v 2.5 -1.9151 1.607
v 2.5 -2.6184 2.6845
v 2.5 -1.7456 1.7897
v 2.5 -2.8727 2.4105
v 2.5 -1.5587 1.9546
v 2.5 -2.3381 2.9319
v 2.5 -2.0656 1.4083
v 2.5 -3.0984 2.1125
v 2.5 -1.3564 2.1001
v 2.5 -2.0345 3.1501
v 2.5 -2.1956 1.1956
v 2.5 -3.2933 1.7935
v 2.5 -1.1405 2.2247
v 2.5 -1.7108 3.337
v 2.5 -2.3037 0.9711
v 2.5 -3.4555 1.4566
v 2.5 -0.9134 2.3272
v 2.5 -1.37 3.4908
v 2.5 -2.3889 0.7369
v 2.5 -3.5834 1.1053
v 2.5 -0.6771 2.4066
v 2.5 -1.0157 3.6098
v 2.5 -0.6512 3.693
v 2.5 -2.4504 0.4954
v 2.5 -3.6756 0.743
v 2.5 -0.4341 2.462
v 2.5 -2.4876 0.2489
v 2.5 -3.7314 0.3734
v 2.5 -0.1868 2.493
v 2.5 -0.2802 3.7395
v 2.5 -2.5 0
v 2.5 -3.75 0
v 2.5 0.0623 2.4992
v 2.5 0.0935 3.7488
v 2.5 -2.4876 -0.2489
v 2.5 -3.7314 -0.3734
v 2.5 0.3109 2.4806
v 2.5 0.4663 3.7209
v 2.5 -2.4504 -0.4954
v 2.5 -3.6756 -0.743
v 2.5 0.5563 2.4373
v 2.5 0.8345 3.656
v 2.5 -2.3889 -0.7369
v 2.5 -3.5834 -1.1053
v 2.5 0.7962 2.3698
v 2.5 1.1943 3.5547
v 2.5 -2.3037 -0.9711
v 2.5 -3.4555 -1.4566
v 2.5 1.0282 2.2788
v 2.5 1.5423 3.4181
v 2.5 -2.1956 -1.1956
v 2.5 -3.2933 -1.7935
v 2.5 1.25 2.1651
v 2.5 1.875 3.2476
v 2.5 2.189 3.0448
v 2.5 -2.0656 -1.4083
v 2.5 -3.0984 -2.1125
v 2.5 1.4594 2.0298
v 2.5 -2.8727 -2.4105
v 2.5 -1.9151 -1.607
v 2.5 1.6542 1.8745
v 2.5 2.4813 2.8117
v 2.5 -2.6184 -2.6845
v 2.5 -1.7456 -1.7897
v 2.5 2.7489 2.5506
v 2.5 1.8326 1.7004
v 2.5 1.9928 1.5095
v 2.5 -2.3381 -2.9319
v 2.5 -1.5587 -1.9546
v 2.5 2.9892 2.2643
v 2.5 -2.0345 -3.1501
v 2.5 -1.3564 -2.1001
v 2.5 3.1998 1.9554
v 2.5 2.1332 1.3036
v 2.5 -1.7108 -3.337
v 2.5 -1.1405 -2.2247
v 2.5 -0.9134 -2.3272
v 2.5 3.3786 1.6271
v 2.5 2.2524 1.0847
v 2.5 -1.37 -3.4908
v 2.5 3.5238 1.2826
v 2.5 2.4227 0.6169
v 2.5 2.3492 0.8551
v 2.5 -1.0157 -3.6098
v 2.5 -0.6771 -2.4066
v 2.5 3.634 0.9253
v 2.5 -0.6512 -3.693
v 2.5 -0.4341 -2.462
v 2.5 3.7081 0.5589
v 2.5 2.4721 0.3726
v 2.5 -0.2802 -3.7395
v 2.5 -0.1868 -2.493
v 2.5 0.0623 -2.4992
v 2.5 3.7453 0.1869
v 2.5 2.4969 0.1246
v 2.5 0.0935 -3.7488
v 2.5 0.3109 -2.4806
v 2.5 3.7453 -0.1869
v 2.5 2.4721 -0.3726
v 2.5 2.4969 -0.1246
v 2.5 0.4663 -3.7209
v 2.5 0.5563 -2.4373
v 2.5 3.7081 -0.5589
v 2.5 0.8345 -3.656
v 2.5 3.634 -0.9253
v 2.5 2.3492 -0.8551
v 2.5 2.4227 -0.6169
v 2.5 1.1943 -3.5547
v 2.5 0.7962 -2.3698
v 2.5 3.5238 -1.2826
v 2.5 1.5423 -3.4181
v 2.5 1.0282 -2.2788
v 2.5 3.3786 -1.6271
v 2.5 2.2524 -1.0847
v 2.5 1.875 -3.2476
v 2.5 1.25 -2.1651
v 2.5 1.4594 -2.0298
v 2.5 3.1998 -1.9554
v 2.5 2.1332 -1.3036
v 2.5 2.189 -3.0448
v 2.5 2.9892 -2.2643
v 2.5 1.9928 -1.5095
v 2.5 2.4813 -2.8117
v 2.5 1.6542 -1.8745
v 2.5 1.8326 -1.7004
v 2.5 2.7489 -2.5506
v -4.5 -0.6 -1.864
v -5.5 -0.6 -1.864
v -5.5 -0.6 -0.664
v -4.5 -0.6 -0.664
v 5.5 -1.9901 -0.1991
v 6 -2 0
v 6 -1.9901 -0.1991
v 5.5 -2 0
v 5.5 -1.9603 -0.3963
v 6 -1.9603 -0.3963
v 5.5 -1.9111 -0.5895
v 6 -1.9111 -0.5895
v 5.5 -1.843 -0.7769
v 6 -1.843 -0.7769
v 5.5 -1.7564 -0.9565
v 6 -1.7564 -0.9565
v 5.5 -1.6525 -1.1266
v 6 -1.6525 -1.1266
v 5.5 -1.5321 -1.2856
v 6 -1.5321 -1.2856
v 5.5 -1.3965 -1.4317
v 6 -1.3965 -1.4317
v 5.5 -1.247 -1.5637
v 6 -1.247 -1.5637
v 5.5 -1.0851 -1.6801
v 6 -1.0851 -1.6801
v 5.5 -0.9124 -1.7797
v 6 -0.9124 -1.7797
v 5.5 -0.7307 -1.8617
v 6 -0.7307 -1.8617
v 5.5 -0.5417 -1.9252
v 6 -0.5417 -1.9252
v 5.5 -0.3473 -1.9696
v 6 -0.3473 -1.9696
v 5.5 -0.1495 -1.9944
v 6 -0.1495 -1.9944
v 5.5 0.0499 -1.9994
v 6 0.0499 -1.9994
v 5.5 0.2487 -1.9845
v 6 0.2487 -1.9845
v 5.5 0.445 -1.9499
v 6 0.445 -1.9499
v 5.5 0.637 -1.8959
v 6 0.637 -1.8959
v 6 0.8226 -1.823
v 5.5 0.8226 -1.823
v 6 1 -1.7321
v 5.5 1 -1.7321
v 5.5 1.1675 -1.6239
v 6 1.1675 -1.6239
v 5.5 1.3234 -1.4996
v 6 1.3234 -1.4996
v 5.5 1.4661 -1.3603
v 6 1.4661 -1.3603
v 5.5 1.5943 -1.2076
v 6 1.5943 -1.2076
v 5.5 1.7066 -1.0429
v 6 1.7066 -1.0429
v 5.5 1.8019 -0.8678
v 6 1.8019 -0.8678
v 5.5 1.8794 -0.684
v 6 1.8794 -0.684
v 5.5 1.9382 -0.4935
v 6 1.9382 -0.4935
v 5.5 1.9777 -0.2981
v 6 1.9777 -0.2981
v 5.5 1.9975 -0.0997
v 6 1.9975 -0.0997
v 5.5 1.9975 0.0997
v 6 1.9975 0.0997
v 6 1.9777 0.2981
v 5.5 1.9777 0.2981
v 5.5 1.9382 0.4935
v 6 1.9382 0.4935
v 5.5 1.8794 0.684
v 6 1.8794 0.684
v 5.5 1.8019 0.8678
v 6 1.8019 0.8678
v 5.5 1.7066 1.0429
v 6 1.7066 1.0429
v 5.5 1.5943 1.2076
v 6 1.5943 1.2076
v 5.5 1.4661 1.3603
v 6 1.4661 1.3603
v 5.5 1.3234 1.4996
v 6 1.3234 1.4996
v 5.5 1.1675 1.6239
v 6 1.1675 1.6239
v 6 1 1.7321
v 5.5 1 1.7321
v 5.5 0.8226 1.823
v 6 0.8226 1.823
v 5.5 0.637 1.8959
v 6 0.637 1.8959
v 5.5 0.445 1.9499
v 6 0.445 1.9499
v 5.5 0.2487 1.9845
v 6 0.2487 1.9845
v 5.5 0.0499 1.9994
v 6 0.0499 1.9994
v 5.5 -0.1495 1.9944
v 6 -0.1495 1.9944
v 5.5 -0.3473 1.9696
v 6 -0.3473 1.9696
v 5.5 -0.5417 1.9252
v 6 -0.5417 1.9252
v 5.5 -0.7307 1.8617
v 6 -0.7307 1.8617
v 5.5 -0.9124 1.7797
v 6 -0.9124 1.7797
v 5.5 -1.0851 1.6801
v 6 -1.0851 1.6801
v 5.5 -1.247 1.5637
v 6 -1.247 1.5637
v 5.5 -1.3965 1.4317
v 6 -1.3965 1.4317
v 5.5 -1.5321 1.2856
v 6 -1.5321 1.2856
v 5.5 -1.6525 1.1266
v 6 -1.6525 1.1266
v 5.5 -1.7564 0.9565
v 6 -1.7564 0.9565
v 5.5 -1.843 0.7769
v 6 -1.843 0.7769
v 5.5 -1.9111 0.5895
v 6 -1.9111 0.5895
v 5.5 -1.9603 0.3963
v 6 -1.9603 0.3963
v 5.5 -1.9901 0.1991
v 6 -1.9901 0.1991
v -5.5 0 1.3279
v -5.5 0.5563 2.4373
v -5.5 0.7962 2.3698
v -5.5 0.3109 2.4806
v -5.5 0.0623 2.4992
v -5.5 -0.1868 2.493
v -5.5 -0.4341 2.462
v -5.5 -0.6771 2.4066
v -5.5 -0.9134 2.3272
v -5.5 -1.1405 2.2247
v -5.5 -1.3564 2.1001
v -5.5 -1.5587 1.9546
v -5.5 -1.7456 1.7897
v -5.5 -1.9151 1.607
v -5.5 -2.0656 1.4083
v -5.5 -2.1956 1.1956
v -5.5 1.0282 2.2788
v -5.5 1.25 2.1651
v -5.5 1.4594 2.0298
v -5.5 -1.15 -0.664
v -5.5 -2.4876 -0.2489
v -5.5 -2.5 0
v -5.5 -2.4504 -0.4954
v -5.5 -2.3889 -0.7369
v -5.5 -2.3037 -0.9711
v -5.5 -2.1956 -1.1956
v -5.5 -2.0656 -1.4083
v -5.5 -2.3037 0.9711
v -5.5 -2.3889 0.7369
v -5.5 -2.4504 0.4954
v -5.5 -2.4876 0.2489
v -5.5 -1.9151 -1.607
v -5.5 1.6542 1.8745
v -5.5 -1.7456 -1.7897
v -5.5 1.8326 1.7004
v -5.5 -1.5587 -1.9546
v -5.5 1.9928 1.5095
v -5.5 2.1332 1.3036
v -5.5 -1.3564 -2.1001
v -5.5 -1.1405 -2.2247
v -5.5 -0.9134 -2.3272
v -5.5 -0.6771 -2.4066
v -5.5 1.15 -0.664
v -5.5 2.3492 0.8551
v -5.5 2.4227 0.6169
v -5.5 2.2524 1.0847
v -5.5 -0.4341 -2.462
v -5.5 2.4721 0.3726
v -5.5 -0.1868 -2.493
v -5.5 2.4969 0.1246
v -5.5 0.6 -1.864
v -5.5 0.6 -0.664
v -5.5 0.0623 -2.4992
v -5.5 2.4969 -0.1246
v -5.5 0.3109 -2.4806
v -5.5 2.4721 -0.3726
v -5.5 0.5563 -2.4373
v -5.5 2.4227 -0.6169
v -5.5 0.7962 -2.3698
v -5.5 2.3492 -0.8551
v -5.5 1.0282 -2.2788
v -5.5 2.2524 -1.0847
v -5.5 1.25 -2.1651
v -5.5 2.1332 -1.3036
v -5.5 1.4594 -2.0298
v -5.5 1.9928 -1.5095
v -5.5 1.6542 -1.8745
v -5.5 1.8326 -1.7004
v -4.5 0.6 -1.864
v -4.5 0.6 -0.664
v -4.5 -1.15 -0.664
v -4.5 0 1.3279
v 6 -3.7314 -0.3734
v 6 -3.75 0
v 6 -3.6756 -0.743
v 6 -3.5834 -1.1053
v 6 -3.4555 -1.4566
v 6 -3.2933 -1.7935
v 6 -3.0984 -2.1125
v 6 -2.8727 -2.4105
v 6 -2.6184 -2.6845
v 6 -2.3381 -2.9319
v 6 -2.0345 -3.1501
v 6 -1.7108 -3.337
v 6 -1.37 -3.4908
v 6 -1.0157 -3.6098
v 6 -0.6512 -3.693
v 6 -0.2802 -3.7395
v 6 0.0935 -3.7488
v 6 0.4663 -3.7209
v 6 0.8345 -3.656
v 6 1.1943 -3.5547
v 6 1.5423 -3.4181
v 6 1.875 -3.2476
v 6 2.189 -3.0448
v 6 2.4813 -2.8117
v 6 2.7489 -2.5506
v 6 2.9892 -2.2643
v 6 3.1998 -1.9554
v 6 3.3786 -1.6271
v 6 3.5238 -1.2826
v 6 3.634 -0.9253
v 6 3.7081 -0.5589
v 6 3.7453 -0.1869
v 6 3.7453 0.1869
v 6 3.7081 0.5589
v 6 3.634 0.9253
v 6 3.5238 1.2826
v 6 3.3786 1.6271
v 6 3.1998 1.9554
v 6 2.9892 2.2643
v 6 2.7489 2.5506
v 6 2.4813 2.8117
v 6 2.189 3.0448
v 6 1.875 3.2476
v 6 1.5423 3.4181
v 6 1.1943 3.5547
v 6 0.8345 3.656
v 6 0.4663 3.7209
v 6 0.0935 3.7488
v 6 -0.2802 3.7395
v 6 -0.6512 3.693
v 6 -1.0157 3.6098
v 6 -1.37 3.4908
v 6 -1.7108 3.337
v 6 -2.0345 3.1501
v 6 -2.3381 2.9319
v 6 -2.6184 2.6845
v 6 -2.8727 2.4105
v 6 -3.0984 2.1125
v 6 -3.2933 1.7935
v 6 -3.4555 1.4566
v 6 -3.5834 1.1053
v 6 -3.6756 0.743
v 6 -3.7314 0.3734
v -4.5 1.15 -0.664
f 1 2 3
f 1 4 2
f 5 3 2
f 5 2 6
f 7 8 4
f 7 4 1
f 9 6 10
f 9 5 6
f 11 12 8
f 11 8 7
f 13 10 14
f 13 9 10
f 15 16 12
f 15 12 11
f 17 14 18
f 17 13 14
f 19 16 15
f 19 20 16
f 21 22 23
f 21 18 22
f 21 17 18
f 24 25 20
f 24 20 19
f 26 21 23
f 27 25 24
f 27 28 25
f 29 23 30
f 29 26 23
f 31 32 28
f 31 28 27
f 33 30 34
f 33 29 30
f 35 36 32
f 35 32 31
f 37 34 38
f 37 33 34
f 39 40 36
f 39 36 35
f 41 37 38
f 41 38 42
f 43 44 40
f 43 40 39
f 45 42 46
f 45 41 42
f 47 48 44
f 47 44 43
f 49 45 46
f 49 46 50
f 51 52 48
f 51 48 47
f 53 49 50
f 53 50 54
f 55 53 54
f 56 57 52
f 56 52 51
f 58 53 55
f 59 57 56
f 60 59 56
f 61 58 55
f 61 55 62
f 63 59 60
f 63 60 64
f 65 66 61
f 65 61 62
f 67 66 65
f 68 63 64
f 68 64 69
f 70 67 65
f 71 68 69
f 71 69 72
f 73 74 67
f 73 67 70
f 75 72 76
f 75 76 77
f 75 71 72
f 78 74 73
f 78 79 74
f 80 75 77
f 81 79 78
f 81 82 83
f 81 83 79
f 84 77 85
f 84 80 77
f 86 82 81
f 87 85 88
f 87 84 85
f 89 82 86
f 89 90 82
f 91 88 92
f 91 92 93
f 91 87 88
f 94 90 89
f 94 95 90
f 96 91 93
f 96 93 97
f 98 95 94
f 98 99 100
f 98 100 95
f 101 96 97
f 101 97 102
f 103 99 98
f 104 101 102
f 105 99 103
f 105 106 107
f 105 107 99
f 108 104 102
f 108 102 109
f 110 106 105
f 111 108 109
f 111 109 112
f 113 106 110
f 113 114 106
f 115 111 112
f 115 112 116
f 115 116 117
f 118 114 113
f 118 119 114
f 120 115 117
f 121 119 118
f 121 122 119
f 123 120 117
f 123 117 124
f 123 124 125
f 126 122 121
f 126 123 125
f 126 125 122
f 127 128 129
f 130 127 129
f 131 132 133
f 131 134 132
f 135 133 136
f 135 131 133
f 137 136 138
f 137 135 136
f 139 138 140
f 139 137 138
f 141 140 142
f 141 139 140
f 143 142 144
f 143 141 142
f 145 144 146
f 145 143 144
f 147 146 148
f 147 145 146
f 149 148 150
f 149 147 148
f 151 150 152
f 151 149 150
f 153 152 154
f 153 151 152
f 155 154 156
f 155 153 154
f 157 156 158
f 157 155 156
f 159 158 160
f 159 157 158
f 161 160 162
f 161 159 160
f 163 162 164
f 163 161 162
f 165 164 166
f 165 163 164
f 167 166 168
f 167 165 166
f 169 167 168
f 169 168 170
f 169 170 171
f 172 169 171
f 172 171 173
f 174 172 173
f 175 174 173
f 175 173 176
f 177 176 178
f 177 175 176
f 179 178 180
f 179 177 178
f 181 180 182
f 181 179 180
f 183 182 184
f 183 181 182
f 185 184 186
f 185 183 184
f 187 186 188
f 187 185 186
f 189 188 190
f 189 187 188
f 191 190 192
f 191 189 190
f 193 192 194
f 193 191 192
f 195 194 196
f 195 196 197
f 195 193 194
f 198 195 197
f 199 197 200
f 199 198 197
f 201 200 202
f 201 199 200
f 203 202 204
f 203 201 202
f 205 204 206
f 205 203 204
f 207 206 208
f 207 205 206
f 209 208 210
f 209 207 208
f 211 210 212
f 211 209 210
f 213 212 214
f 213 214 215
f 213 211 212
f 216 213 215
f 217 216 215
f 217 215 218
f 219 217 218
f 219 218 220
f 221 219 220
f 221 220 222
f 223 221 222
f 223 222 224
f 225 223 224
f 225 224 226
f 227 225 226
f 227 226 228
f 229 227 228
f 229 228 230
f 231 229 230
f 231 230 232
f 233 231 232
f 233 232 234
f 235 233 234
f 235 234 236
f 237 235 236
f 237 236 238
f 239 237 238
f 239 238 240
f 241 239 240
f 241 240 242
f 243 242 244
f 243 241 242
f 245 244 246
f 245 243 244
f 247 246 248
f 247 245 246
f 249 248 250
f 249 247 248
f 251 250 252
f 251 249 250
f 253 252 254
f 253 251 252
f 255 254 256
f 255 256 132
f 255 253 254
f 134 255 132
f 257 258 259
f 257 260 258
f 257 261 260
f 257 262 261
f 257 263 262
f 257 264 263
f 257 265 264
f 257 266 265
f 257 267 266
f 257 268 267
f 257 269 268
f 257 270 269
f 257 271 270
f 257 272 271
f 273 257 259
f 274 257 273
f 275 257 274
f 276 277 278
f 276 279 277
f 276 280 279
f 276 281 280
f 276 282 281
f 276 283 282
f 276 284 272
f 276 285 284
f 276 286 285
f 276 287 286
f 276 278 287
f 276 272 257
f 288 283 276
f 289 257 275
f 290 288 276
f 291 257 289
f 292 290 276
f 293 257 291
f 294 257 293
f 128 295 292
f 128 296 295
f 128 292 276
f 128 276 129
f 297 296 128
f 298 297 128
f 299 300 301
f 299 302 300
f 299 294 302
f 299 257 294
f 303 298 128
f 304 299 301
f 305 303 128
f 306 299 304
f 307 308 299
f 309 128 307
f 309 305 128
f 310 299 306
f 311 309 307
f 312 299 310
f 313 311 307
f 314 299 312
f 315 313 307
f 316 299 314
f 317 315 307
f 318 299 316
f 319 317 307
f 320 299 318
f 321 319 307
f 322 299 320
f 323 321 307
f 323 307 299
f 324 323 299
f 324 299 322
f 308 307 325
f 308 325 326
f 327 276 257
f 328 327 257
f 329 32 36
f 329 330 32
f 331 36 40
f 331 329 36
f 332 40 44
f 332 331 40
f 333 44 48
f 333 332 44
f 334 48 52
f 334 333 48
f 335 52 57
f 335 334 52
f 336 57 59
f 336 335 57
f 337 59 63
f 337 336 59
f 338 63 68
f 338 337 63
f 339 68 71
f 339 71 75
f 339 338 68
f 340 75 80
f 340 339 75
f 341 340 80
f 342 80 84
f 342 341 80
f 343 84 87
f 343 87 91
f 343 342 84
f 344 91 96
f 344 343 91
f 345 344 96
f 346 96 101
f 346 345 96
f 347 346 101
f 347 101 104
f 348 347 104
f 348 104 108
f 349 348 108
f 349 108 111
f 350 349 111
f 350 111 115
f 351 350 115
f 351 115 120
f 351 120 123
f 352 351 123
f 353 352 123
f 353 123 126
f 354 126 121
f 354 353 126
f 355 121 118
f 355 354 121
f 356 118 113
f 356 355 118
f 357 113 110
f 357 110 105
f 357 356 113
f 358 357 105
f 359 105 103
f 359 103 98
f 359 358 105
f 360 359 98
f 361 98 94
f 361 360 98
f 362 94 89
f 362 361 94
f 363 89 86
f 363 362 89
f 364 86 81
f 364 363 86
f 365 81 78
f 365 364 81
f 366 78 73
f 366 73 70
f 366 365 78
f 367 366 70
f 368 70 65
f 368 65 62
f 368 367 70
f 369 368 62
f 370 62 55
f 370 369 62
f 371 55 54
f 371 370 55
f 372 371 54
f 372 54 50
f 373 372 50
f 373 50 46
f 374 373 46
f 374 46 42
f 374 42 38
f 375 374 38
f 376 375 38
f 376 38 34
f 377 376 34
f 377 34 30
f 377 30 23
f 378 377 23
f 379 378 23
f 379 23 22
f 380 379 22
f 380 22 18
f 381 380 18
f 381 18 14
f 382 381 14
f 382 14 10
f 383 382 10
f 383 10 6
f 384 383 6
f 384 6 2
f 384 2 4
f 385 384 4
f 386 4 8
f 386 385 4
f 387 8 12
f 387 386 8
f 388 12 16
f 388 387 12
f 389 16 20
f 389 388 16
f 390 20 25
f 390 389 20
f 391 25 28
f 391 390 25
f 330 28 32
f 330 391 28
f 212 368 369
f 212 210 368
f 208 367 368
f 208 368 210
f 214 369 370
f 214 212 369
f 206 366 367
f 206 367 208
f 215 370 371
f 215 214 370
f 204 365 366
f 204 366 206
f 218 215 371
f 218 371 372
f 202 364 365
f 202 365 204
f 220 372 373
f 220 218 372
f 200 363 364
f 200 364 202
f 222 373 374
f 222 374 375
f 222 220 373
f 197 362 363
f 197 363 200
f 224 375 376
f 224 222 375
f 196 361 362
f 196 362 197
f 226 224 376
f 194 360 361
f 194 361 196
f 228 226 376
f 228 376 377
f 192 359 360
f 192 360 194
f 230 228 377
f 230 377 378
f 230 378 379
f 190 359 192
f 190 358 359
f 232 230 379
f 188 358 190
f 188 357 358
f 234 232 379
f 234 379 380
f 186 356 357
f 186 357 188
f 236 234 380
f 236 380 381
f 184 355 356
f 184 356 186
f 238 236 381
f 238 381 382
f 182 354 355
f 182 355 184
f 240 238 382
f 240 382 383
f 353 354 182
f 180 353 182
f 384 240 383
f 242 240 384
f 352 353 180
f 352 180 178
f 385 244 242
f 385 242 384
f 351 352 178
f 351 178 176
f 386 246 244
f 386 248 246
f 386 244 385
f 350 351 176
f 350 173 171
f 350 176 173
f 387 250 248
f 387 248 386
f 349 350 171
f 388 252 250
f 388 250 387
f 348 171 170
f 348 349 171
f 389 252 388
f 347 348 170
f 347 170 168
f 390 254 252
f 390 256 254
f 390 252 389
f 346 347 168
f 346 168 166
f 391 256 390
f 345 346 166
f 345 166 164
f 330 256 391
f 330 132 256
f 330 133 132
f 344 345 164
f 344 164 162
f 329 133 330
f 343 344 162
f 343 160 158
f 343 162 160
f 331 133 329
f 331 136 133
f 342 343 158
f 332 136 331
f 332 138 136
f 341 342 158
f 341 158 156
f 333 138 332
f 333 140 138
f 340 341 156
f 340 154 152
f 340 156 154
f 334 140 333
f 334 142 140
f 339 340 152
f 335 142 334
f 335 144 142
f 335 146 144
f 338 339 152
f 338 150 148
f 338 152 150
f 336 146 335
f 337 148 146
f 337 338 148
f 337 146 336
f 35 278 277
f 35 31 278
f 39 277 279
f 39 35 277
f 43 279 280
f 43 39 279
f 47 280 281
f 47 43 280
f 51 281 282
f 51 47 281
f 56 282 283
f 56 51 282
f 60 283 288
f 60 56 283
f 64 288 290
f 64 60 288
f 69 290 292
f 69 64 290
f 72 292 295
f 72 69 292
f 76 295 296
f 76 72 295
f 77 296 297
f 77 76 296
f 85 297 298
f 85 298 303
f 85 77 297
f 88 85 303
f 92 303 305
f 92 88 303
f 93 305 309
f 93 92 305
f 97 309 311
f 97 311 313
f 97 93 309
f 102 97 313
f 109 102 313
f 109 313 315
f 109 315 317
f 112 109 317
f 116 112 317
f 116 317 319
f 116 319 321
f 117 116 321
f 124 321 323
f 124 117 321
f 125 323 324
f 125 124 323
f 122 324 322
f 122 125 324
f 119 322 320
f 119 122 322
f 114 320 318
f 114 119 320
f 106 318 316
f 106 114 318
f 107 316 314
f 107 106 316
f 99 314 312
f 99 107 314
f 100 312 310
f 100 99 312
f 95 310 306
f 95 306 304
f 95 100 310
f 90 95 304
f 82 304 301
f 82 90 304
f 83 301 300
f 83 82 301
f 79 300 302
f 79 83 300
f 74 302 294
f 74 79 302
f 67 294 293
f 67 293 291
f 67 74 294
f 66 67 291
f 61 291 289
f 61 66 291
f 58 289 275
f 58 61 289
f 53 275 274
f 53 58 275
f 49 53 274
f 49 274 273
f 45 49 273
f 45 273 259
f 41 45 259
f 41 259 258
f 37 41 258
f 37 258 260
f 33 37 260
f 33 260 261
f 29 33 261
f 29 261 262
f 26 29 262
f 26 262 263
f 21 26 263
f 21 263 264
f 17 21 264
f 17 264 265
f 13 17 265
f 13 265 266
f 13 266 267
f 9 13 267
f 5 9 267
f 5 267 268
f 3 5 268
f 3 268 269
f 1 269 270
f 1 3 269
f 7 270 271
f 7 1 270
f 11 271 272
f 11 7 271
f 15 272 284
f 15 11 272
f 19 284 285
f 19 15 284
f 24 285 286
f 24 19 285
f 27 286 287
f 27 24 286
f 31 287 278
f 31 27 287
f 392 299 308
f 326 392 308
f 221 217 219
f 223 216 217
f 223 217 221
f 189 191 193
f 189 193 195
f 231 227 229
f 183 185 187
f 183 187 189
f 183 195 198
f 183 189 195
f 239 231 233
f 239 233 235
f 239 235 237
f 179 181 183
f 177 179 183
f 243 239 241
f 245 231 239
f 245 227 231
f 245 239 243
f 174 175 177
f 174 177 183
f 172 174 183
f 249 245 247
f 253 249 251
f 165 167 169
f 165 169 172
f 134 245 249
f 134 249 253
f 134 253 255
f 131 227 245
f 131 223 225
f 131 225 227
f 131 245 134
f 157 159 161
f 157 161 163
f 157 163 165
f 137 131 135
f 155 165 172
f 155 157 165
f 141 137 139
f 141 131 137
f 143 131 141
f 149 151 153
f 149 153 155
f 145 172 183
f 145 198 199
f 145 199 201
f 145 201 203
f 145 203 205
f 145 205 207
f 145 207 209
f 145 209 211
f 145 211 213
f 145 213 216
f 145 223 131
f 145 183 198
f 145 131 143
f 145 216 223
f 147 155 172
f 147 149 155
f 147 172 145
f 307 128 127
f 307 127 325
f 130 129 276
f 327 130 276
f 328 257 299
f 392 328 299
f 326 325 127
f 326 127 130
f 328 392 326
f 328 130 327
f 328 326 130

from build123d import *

# Parameters (mm, degrees)
ESBO_O2_W             = 1.2
ESBO_O2_H             = 1.2
CORTE_EXTRUS_O1_DEPTH = 1


with BuildPart() as part:
    # Esboço1 → Revolução1 (revolve)
    with BuildSketch(Plane(origin=(0, 0, 0), x_dir=(0, 1, 0), z_dir=(0, 0, 1))):
        Polygon((0, 5.5), (-2.5, 5.5), (-2.5, -2.5), (-3.75, -2.5), (-3.75, -3.560606061), (-3.75, -6), (-2, -6), (-2, -5.5), (0, -5.5), align=None)
    revolve(axis=Axis((-5.5, 0, 0), (1, 0, 0)))

    # Esboço2 → Corte-extrusão1 (cut)
    with BuildSketch(Plane.ZY.offset(5.5)):
        Polygon((-0.66395281, -1.15), (1.327905619, 0), (-0.66395281, 1.15), align=None)
        with Locations((-1.26395281, 0)):
            Rectangle(ESBO_O2_W, ESBO_O2_H)
    extrude(amount=-CORTE_EXTRUS_O1_DEPTH, mode=Mode.SUBTRACT)


solid = part.part
